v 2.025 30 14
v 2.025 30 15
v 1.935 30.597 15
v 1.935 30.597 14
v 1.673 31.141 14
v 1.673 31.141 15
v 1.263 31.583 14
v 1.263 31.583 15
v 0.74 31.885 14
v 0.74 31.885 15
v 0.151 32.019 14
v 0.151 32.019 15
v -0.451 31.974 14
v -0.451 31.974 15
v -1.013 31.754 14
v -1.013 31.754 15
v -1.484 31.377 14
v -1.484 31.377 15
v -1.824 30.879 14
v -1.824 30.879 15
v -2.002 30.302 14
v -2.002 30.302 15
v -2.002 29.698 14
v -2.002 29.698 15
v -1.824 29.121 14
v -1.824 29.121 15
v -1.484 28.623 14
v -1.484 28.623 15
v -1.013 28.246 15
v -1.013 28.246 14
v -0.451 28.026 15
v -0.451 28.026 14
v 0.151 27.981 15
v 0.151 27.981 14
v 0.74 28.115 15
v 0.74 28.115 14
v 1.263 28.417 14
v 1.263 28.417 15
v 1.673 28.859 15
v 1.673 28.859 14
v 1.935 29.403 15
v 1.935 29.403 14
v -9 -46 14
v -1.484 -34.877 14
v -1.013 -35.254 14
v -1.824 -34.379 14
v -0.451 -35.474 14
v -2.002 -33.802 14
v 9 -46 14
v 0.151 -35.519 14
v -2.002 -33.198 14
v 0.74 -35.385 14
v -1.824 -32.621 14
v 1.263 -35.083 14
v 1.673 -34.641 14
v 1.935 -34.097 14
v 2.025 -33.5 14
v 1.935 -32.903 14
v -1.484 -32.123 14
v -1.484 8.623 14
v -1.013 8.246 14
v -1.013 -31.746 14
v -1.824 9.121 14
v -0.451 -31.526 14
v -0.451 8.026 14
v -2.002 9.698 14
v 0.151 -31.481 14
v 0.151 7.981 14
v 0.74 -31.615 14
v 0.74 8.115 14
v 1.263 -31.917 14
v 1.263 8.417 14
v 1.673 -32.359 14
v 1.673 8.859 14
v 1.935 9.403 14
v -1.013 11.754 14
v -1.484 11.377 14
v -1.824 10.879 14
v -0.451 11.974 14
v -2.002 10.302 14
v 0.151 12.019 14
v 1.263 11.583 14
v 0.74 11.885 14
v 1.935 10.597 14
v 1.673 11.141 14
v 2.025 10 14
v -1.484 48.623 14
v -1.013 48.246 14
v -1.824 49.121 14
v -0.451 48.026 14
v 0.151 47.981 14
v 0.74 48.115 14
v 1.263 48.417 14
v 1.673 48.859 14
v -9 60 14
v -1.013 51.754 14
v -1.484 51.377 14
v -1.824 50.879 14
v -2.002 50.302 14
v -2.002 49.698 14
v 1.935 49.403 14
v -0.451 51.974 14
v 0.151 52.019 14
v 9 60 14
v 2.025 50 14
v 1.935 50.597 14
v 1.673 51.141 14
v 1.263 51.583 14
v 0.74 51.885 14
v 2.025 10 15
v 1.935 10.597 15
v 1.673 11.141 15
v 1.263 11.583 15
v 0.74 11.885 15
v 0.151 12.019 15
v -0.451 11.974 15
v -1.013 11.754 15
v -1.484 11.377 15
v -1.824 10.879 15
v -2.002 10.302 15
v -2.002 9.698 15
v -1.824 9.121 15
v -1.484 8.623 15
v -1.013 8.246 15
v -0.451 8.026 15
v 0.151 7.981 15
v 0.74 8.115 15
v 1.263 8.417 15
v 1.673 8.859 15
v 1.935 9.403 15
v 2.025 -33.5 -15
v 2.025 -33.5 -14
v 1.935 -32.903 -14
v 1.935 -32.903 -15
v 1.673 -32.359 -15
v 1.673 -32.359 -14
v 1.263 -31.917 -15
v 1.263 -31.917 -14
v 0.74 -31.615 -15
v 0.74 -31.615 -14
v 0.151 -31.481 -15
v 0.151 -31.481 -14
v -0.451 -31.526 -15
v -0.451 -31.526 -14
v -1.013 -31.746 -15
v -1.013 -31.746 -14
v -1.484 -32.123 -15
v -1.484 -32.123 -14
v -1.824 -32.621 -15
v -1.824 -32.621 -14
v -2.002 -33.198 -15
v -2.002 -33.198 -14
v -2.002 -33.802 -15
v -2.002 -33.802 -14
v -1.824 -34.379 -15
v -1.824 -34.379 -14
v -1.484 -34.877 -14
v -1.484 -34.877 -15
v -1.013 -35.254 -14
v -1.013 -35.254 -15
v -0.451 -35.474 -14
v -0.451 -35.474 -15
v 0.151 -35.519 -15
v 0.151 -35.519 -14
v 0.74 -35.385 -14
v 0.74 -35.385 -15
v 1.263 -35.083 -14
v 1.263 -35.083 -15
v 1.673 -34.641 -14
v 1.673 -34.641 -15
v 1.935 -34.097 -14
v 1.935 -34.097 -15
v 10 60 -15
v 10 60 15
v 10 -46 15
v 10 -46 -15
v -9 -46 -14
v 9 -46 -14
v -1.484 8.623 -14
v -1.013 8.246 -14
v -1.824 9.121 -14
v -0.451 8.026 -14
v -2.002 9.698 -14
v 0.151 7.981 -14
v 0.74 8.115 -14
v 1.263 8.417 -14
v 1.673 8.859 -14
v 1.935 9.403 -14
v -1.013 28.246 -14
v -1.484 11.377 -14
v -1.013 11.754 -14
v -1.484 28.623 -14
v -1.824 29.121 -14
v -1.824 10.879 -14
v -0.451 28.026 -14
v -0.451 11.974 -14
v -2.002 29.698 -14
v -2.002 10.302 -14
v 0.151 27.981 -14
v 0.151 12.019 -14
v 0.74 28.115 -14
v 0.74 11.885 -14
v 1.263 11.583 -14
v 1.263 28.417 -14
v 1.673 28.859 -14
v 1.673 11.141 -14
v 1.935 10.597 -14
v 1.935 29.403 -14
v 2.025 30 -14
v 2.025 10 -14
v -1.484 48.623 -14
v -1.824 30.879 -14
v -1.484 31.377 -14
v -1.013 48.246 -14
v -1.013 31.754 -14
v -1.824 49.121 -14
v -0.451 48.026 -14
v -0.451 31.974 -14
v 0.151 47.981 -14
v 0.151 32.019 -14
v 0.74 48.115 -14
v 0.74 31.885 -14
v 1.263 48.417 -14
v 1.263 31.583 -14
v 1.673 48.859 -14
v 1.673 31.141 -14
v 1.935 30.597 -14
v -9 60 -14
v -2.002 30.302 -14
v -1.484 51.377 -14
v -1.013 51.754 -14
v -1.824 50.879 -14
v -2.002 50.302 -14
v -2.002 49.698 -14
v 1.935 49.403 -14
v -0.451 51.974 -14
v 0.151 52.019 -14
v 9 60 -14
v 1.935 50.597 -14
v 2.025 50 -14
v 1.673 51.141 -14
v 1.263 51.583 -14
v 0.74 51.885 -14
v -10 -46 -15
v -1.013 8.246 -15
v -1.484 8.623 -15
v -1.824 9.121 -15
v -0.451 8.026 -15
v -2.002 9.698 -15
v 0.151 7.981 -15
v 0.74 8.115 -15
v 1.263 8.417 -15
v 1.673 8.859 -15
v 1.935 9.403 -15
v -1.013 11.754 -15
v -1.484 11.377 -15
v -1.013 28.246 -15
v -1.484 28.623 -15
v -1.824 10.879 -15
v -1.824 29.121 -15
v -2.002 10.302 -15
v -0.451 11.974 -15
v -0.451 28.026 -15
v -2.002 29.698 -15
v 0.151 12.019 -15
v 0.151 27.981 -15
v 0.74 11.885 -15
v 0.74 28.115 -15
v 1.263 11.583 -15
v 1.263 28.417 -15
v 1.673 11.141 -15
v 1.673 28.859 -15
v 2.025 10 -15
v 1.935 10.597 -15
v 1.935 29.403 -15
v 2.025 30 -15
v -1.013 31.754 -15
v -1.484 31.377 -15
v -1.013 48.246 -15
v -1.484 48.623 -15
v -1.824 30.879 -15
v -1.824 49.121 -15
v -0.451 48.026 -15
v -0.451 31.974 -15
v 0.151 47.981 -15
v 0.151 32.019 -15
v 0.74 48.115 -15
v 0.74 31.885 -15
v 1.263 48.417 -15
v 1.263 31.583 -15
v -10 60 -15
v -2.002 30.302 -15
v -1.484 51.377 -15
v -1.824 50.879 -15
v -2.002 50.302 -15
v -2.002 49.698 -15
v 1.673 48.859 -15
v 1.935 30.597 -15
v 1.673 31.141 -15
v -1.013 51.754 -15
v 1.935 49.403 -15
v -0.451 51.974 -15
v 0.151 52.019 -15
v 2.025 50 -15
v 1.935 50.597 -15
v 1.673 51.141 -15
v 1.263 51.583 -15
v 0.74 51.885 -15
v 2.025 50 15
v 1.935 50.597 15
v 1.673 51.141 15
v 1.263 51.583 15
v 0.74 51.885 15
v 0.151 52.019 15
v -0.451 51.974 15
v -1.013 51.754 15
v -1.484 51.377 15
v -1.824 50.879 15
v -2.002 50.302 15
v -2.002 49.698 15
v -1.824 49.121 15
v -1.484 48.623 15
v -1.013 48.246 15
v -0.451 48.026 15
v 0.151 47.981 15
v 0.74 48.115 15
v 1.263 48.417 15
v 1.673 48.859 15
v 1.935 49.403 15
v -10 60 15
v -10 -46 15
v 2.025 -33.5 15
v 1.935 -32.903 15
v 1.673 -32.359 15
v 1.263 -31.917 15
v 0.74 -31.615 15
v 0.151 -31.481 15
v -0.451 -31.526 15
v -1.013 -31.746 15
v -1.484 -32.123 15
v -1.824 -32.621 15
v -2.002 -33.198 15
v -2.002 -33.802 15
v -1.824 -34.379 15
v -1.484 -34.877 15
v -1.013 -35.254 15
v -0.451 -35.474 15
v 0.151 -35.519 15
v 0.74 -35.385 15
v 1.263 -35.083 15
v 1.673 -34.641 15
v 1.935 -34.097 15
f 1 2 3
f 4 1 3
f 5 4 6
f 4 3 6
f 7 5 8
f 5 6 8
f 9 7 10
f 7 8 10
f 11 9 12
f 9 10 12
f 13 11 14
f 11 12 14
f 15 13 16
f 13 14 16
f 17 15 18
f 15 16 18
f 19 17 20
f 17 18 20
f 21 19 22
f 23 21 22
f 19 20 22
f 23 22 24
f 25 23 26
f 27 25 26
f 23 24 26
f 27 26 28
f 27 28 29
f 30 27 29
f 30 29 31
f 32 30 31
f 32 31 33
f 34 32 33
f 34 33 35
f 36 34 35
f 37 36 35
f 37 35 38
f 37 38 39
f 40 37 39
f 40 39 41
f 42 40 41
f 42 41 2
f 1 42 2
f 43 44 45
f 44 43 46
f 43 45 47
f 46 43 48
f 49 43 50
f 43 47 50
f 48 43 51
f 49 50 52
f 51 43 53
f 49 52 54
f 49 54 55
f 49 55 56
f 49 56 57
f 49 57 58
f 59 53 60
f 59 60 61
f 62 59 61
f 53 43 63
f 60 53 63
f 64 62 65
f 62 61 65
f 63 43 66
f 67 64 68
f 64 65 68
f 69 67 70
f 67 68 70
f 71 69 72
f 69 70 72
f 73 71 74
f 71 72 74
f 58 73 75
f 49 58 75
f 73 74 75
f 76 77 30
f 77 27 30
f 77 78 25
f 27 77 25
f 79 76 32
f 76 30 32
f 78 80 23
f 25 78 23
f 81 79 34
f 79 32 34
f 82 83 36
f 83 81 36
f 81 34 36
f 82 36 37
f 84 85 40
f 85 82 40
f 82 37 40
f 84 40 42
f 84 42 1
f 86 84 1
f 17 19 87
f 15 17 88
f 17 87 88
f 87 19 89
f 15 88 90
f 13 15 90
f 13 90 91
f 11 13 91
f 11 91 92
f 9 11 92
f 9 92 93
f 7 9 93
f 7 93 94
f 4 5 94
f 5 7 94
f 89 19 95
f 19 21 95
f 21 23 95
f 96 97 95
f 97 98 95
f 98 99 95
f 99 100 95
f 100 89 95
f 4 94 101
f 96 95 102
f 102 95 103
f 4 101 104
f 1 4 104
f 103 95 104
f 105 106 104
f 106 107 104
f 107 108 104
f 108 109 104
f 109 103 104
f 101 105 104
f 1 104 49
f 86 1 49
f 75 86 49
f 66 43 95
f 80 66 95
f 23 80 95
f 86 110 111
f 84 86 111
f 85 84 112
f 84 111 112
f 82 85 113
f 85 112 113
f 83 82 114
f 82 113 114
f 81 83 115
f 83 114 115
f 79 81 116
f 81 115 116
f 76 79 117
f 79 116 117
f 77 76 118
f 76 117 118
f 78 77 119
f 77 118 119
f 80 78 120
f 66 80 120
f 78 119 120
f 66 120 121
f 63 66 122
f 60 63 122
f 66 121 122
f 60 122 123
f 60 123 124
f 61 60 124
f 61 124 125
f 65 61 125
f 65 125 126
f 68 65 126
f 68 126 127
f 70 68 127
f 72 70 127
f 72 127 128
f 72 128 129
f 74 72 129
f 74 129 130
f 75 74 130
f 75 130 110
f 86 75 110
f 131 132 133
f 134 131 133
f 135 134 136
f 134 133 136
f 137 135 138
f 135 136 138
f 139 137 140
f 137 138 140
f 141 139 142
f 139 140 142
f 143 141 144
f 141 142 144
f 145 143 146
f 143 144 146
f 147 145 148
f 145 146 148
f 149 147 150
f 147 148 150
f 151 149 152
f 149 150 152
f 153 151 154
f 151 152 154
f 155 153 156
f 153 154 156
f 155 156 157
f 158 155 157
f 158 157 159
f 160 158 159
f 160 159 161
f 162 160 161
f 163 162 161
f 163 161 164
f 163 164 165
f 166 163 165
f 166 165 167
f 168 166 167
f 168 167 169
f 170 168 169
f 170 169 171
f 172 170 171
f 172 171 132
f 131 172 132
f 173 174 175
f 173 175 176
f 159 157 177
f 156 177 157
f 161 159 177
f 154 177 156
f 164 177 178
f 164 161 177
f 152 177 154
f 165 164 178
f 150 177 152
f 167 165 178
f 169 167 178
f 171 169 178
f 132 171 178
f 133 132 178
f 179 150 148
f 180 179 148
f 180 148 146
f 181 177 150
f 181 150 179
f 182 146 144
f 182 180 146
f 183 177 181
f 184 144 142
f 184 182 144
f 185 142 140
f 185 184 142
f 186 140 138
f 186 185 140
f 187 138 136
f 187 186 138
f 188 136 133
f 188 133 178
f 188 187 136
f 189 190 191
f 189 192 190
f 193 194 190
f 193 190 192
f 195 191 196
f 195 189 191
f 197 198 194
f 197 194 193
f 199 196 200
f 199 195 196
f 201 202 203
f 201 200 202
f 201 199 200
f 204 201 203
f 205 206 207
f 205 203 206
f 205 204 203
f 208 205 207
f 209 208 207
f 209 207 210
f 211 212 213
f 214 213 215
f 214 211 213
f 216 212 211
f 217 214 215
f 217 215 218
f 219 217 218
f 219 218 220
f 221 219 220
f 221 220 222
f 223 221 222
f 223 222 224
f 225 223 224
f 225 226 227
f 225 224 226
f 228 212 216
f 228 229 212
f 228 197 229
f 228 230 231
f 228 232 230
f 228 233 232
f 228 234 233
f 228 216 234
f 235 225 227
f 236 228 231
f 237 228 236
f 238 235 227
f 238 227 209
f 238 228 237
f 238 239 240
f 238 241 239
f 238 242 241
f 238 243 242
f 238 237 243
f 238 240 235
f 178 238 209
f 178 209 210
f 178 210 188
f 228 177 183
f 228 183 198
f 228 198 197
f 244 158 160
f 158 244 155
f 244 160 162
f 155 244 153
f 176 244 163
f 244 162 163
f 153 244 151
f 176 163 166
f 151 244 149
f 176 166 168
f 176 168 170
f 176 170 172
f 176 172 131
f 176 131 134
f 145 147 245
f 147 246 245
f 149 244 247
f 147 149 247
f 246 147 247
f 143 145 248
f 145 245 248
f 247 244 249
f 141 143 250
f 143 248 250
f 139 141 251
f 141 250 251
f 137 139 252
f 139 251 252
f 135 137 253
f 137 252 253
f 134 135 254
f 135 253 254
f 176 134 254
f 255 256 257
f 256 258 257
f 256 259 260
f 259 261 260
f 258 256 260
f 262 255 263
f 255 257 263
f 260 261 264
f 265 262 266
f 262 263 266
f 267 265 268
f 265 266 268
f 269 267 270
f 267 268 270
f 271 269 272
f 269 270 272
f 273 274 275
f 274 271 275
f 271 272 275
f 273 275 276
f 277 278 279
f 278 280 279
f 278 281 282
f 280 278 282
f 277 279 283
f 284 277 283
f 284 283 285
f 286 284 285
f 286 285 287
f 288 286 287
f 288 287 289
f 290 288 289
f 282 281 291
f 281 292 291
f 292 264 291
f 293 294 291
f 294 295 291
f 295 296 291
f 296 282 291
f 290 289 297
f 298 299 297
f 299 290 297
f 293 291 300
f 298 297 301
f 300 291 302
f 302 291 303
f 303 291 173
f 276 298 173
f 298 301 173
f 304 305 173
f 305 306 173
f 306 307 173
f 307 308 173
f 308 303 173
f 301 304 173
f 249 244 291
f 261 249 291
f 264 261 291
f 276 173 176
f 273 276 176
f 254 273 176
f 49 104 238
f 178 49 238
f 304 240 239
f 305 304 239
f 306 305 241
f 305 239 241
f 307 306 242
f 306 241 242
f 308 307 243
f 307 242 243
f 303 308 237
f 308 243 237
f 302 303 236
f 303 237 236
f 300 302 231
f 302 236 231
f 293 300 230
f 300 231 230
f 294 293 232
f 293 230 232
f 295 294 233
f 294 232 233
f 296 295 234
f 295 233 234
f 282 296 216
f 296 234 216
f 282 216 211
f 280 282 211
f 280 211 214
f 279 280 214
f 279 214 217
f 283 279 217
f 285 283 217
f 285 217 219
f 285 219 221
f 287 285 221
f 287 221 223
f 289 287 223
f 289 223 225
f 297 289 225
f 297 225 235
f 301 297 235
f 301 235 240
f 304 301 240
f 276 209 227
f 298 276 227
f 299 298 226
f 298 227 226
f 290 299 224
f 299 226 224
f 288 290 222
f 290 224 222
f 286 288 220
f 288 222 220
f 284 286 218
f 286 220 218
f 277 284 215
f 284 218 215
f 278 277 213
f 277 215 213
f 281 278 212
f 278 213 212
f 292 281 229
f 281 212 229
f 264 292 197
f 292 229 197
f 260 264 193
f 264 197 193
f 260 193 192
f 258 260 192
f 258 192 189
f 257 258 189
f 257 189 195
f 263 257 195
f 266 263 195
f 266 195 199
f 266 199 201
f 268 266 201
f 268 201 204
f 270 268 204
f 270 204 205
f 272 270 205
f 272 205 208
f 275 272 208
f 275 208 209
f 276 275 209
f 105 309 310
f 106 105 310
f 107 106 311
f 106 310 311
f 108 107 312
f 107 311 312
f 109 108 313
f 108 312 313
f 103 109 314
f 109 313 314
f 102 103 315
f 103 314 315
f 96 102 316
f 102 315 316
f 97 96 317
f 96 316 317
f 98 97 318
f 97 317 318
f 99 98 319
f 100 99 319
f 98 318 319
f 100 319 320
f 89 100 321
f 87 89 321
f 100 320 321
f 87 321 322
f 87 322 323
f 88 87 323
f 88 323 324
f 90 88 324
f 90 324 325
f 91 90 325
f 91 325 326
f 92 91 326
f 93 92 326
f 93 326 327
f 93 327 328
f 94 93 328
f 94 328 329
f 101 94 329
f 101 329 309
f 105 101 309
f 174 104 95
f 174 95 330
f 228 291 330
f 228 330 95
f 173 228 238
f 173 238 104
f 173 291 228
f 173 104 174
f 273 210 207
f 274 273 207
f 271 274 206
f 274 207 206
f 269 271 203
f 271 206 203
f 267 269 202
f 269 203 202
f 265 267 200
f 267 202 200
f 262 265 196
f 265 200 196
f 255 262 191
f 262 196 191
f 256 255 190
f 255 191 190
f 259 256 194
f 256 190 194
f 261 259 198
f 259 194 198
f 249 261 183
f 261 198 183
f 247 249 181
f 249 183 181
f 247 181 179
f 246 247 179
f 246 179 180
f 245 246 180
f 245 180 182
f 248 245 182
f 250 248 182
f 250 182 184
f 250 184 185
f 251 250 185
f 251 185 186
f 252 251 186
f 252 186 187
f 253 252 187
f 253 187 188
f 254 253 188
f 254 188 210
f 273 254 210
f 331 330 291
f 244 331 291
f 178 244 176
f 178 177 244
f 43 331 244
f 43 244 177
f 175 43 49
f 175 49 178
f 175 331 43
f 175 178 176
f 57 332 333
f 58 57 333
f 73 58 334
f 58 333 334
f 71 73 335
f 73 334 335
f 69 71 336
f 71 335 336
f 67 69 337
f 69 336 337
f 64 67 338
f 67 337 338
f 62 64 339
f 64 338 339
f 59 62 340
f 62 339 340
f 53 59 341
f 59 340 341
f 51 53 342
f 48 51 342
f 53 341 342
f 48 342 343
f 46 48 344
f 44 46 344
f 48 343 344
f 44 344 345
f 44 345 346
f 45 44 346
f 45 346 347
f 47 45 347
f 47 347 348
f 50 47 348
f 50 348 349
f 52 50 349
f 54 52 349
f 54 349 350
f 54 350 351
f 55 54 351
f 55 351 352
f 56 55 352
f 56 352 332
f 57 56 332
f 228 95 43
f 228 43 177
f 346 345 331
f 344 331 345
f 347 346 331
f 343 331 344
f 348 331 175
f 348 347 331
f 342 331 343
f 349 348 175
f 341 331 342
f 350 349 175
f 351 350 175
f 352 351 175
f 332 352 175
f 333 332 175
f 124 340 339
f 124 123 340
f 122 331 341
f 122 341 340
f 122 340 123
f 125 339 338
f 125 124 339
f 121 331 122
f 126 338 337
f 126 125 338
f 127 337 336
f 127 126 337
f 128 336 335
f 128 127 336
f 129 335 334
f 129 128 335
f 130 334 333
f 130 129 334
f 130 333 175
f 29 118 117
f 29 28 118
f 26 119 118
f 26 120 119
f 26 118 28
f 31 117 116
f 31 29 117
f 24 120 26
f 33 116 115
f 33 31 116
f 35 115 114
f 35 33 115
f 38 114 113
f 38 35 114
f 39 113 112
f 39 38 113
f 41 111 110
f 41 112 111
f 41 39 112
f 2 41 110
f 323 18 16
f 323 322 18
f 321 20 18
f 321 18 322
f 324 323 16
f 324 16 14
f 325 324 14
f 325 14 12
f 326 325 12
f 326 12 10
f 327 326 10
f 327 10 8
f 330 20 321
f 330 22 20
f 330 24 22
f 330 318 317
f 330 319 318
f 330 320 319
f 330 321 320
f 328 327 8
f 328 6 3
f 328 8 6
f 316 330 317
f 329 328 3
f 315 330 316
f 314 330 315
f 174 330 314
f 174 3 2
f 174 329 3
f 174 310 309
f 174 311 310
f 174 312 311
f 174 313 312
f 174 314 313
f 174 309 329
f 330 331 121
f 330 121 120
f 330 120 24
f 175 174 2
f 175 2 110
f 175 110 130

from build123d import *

# Parameters (mm, degrees)
SKETCH_2_W               = 20
SKETCH_2_H               = 30
EXTRUDE_1_DEPTH          = 60
SKETCH_3_W               = 18
SKETCH_3_H               = 28
CUT_EXTRUDE_1_DEPTH      = 61
CUT_EXTRUDE_1_DEPTH_BACK = 61
SKETCH_5_W               = 20
SKETCH_5_H               = 14
CUT_EXTRUDE_3_DEPTH      = 1
CUT_EXTRUDE_3_DEPTH_BACK = 31
SKETCH_6_R               = 2.025
CUT_EXTRUDE_4_DEPTH      = 31
SKETCH_7_R               = 2.025
CUT_EXTRUDE_5_DEPTH      = 1
CUT_EXTRUDE_5_DEPTH_BACK = 31


with BuildPart() as part:
    # 草图2 → 凸台-拉伸1 (new body, symmetric)
    with BuildSketch(Plane(origin=(0, 0, 0), x_dir=(1, 0, 0), z_dir=(0, 1, 0))):
        Rectangle(SKETCH_2_W, SKETCH_2_H)
    extrude(amount=EXTRUDE_1_DEPTH, both=True)

    # 草图3 → 切除-拉伸1 (cut, two sides)
    with BuildSketch(Plane(origin=(0, 0, 0), x_dir=(1, 0, 0), z_dir=(0, 1, 0))) as cut_extrude_1_sk:
        Rectangle(SKETCH_3_W, SKETCH_3_H)
    extrude(amount=CUT_EXTRUDE_1_DEPTH, mode=Mode.SUBTRACT)
    extrude(cut_extrude_1_sk.sketch, amount=-CUT_EXTRUDE_1_DEPTH_BACK, mode=Mode.SUBTRACT)

    # 草图5 → 切除-拉伸3 (cut, two sides)
    with BuildSketch(Plane.XY.offset(15)) as cut_extrude_3_sk:
        with Locations((0, -53)):
            Rectangle(SKETCH_5_W, SKETCH_5_H)
    extrude(amount=CUT_EXTRUDE_3_DEPTH, mode=Mode.SUBTRACT)
    extrude(cut_extrude_3_sk.sketch, amount=-CUT_EXTRUDE_3_DEPTH_BACK, mode=Mode.SUBTRACT)

    # 草图6 → 切除-拉伸4 (cut, through all)
    with BuildSketch(Plane.XY.offset(15)):
        with Locations((0, -33.5)):
            Circle(SKETCH_6_R)
    extrude(amount=-CUT_EXTRUDE_4_DEPTH, mode=Mode.SUBTRACT)

    # 草图7 → 切除-拉伸5 (cut, two sides)
    with BuildSketch(Plane.XY.offset(15)) as cut_extrude_5_sk:
        with Locations((0, 50)):
            Circle(SKETCH_7_R)
        with Locations((0, 30)):
            Circle(SKETCH_7_R)
        with Locations((0, 10)):
            Circle(SKETCH_7_R)
    extrude(amount=CUT_EXTRUDE_5_DEPTH, mode=Mode.SUBTRACT)
    extrude(cut_extrude_5_sk.sketch, amount=-CUT_EXTRUDE_5_DEPTH_BACK, mode=Mode.SUBTRACT)


solid = part.part
